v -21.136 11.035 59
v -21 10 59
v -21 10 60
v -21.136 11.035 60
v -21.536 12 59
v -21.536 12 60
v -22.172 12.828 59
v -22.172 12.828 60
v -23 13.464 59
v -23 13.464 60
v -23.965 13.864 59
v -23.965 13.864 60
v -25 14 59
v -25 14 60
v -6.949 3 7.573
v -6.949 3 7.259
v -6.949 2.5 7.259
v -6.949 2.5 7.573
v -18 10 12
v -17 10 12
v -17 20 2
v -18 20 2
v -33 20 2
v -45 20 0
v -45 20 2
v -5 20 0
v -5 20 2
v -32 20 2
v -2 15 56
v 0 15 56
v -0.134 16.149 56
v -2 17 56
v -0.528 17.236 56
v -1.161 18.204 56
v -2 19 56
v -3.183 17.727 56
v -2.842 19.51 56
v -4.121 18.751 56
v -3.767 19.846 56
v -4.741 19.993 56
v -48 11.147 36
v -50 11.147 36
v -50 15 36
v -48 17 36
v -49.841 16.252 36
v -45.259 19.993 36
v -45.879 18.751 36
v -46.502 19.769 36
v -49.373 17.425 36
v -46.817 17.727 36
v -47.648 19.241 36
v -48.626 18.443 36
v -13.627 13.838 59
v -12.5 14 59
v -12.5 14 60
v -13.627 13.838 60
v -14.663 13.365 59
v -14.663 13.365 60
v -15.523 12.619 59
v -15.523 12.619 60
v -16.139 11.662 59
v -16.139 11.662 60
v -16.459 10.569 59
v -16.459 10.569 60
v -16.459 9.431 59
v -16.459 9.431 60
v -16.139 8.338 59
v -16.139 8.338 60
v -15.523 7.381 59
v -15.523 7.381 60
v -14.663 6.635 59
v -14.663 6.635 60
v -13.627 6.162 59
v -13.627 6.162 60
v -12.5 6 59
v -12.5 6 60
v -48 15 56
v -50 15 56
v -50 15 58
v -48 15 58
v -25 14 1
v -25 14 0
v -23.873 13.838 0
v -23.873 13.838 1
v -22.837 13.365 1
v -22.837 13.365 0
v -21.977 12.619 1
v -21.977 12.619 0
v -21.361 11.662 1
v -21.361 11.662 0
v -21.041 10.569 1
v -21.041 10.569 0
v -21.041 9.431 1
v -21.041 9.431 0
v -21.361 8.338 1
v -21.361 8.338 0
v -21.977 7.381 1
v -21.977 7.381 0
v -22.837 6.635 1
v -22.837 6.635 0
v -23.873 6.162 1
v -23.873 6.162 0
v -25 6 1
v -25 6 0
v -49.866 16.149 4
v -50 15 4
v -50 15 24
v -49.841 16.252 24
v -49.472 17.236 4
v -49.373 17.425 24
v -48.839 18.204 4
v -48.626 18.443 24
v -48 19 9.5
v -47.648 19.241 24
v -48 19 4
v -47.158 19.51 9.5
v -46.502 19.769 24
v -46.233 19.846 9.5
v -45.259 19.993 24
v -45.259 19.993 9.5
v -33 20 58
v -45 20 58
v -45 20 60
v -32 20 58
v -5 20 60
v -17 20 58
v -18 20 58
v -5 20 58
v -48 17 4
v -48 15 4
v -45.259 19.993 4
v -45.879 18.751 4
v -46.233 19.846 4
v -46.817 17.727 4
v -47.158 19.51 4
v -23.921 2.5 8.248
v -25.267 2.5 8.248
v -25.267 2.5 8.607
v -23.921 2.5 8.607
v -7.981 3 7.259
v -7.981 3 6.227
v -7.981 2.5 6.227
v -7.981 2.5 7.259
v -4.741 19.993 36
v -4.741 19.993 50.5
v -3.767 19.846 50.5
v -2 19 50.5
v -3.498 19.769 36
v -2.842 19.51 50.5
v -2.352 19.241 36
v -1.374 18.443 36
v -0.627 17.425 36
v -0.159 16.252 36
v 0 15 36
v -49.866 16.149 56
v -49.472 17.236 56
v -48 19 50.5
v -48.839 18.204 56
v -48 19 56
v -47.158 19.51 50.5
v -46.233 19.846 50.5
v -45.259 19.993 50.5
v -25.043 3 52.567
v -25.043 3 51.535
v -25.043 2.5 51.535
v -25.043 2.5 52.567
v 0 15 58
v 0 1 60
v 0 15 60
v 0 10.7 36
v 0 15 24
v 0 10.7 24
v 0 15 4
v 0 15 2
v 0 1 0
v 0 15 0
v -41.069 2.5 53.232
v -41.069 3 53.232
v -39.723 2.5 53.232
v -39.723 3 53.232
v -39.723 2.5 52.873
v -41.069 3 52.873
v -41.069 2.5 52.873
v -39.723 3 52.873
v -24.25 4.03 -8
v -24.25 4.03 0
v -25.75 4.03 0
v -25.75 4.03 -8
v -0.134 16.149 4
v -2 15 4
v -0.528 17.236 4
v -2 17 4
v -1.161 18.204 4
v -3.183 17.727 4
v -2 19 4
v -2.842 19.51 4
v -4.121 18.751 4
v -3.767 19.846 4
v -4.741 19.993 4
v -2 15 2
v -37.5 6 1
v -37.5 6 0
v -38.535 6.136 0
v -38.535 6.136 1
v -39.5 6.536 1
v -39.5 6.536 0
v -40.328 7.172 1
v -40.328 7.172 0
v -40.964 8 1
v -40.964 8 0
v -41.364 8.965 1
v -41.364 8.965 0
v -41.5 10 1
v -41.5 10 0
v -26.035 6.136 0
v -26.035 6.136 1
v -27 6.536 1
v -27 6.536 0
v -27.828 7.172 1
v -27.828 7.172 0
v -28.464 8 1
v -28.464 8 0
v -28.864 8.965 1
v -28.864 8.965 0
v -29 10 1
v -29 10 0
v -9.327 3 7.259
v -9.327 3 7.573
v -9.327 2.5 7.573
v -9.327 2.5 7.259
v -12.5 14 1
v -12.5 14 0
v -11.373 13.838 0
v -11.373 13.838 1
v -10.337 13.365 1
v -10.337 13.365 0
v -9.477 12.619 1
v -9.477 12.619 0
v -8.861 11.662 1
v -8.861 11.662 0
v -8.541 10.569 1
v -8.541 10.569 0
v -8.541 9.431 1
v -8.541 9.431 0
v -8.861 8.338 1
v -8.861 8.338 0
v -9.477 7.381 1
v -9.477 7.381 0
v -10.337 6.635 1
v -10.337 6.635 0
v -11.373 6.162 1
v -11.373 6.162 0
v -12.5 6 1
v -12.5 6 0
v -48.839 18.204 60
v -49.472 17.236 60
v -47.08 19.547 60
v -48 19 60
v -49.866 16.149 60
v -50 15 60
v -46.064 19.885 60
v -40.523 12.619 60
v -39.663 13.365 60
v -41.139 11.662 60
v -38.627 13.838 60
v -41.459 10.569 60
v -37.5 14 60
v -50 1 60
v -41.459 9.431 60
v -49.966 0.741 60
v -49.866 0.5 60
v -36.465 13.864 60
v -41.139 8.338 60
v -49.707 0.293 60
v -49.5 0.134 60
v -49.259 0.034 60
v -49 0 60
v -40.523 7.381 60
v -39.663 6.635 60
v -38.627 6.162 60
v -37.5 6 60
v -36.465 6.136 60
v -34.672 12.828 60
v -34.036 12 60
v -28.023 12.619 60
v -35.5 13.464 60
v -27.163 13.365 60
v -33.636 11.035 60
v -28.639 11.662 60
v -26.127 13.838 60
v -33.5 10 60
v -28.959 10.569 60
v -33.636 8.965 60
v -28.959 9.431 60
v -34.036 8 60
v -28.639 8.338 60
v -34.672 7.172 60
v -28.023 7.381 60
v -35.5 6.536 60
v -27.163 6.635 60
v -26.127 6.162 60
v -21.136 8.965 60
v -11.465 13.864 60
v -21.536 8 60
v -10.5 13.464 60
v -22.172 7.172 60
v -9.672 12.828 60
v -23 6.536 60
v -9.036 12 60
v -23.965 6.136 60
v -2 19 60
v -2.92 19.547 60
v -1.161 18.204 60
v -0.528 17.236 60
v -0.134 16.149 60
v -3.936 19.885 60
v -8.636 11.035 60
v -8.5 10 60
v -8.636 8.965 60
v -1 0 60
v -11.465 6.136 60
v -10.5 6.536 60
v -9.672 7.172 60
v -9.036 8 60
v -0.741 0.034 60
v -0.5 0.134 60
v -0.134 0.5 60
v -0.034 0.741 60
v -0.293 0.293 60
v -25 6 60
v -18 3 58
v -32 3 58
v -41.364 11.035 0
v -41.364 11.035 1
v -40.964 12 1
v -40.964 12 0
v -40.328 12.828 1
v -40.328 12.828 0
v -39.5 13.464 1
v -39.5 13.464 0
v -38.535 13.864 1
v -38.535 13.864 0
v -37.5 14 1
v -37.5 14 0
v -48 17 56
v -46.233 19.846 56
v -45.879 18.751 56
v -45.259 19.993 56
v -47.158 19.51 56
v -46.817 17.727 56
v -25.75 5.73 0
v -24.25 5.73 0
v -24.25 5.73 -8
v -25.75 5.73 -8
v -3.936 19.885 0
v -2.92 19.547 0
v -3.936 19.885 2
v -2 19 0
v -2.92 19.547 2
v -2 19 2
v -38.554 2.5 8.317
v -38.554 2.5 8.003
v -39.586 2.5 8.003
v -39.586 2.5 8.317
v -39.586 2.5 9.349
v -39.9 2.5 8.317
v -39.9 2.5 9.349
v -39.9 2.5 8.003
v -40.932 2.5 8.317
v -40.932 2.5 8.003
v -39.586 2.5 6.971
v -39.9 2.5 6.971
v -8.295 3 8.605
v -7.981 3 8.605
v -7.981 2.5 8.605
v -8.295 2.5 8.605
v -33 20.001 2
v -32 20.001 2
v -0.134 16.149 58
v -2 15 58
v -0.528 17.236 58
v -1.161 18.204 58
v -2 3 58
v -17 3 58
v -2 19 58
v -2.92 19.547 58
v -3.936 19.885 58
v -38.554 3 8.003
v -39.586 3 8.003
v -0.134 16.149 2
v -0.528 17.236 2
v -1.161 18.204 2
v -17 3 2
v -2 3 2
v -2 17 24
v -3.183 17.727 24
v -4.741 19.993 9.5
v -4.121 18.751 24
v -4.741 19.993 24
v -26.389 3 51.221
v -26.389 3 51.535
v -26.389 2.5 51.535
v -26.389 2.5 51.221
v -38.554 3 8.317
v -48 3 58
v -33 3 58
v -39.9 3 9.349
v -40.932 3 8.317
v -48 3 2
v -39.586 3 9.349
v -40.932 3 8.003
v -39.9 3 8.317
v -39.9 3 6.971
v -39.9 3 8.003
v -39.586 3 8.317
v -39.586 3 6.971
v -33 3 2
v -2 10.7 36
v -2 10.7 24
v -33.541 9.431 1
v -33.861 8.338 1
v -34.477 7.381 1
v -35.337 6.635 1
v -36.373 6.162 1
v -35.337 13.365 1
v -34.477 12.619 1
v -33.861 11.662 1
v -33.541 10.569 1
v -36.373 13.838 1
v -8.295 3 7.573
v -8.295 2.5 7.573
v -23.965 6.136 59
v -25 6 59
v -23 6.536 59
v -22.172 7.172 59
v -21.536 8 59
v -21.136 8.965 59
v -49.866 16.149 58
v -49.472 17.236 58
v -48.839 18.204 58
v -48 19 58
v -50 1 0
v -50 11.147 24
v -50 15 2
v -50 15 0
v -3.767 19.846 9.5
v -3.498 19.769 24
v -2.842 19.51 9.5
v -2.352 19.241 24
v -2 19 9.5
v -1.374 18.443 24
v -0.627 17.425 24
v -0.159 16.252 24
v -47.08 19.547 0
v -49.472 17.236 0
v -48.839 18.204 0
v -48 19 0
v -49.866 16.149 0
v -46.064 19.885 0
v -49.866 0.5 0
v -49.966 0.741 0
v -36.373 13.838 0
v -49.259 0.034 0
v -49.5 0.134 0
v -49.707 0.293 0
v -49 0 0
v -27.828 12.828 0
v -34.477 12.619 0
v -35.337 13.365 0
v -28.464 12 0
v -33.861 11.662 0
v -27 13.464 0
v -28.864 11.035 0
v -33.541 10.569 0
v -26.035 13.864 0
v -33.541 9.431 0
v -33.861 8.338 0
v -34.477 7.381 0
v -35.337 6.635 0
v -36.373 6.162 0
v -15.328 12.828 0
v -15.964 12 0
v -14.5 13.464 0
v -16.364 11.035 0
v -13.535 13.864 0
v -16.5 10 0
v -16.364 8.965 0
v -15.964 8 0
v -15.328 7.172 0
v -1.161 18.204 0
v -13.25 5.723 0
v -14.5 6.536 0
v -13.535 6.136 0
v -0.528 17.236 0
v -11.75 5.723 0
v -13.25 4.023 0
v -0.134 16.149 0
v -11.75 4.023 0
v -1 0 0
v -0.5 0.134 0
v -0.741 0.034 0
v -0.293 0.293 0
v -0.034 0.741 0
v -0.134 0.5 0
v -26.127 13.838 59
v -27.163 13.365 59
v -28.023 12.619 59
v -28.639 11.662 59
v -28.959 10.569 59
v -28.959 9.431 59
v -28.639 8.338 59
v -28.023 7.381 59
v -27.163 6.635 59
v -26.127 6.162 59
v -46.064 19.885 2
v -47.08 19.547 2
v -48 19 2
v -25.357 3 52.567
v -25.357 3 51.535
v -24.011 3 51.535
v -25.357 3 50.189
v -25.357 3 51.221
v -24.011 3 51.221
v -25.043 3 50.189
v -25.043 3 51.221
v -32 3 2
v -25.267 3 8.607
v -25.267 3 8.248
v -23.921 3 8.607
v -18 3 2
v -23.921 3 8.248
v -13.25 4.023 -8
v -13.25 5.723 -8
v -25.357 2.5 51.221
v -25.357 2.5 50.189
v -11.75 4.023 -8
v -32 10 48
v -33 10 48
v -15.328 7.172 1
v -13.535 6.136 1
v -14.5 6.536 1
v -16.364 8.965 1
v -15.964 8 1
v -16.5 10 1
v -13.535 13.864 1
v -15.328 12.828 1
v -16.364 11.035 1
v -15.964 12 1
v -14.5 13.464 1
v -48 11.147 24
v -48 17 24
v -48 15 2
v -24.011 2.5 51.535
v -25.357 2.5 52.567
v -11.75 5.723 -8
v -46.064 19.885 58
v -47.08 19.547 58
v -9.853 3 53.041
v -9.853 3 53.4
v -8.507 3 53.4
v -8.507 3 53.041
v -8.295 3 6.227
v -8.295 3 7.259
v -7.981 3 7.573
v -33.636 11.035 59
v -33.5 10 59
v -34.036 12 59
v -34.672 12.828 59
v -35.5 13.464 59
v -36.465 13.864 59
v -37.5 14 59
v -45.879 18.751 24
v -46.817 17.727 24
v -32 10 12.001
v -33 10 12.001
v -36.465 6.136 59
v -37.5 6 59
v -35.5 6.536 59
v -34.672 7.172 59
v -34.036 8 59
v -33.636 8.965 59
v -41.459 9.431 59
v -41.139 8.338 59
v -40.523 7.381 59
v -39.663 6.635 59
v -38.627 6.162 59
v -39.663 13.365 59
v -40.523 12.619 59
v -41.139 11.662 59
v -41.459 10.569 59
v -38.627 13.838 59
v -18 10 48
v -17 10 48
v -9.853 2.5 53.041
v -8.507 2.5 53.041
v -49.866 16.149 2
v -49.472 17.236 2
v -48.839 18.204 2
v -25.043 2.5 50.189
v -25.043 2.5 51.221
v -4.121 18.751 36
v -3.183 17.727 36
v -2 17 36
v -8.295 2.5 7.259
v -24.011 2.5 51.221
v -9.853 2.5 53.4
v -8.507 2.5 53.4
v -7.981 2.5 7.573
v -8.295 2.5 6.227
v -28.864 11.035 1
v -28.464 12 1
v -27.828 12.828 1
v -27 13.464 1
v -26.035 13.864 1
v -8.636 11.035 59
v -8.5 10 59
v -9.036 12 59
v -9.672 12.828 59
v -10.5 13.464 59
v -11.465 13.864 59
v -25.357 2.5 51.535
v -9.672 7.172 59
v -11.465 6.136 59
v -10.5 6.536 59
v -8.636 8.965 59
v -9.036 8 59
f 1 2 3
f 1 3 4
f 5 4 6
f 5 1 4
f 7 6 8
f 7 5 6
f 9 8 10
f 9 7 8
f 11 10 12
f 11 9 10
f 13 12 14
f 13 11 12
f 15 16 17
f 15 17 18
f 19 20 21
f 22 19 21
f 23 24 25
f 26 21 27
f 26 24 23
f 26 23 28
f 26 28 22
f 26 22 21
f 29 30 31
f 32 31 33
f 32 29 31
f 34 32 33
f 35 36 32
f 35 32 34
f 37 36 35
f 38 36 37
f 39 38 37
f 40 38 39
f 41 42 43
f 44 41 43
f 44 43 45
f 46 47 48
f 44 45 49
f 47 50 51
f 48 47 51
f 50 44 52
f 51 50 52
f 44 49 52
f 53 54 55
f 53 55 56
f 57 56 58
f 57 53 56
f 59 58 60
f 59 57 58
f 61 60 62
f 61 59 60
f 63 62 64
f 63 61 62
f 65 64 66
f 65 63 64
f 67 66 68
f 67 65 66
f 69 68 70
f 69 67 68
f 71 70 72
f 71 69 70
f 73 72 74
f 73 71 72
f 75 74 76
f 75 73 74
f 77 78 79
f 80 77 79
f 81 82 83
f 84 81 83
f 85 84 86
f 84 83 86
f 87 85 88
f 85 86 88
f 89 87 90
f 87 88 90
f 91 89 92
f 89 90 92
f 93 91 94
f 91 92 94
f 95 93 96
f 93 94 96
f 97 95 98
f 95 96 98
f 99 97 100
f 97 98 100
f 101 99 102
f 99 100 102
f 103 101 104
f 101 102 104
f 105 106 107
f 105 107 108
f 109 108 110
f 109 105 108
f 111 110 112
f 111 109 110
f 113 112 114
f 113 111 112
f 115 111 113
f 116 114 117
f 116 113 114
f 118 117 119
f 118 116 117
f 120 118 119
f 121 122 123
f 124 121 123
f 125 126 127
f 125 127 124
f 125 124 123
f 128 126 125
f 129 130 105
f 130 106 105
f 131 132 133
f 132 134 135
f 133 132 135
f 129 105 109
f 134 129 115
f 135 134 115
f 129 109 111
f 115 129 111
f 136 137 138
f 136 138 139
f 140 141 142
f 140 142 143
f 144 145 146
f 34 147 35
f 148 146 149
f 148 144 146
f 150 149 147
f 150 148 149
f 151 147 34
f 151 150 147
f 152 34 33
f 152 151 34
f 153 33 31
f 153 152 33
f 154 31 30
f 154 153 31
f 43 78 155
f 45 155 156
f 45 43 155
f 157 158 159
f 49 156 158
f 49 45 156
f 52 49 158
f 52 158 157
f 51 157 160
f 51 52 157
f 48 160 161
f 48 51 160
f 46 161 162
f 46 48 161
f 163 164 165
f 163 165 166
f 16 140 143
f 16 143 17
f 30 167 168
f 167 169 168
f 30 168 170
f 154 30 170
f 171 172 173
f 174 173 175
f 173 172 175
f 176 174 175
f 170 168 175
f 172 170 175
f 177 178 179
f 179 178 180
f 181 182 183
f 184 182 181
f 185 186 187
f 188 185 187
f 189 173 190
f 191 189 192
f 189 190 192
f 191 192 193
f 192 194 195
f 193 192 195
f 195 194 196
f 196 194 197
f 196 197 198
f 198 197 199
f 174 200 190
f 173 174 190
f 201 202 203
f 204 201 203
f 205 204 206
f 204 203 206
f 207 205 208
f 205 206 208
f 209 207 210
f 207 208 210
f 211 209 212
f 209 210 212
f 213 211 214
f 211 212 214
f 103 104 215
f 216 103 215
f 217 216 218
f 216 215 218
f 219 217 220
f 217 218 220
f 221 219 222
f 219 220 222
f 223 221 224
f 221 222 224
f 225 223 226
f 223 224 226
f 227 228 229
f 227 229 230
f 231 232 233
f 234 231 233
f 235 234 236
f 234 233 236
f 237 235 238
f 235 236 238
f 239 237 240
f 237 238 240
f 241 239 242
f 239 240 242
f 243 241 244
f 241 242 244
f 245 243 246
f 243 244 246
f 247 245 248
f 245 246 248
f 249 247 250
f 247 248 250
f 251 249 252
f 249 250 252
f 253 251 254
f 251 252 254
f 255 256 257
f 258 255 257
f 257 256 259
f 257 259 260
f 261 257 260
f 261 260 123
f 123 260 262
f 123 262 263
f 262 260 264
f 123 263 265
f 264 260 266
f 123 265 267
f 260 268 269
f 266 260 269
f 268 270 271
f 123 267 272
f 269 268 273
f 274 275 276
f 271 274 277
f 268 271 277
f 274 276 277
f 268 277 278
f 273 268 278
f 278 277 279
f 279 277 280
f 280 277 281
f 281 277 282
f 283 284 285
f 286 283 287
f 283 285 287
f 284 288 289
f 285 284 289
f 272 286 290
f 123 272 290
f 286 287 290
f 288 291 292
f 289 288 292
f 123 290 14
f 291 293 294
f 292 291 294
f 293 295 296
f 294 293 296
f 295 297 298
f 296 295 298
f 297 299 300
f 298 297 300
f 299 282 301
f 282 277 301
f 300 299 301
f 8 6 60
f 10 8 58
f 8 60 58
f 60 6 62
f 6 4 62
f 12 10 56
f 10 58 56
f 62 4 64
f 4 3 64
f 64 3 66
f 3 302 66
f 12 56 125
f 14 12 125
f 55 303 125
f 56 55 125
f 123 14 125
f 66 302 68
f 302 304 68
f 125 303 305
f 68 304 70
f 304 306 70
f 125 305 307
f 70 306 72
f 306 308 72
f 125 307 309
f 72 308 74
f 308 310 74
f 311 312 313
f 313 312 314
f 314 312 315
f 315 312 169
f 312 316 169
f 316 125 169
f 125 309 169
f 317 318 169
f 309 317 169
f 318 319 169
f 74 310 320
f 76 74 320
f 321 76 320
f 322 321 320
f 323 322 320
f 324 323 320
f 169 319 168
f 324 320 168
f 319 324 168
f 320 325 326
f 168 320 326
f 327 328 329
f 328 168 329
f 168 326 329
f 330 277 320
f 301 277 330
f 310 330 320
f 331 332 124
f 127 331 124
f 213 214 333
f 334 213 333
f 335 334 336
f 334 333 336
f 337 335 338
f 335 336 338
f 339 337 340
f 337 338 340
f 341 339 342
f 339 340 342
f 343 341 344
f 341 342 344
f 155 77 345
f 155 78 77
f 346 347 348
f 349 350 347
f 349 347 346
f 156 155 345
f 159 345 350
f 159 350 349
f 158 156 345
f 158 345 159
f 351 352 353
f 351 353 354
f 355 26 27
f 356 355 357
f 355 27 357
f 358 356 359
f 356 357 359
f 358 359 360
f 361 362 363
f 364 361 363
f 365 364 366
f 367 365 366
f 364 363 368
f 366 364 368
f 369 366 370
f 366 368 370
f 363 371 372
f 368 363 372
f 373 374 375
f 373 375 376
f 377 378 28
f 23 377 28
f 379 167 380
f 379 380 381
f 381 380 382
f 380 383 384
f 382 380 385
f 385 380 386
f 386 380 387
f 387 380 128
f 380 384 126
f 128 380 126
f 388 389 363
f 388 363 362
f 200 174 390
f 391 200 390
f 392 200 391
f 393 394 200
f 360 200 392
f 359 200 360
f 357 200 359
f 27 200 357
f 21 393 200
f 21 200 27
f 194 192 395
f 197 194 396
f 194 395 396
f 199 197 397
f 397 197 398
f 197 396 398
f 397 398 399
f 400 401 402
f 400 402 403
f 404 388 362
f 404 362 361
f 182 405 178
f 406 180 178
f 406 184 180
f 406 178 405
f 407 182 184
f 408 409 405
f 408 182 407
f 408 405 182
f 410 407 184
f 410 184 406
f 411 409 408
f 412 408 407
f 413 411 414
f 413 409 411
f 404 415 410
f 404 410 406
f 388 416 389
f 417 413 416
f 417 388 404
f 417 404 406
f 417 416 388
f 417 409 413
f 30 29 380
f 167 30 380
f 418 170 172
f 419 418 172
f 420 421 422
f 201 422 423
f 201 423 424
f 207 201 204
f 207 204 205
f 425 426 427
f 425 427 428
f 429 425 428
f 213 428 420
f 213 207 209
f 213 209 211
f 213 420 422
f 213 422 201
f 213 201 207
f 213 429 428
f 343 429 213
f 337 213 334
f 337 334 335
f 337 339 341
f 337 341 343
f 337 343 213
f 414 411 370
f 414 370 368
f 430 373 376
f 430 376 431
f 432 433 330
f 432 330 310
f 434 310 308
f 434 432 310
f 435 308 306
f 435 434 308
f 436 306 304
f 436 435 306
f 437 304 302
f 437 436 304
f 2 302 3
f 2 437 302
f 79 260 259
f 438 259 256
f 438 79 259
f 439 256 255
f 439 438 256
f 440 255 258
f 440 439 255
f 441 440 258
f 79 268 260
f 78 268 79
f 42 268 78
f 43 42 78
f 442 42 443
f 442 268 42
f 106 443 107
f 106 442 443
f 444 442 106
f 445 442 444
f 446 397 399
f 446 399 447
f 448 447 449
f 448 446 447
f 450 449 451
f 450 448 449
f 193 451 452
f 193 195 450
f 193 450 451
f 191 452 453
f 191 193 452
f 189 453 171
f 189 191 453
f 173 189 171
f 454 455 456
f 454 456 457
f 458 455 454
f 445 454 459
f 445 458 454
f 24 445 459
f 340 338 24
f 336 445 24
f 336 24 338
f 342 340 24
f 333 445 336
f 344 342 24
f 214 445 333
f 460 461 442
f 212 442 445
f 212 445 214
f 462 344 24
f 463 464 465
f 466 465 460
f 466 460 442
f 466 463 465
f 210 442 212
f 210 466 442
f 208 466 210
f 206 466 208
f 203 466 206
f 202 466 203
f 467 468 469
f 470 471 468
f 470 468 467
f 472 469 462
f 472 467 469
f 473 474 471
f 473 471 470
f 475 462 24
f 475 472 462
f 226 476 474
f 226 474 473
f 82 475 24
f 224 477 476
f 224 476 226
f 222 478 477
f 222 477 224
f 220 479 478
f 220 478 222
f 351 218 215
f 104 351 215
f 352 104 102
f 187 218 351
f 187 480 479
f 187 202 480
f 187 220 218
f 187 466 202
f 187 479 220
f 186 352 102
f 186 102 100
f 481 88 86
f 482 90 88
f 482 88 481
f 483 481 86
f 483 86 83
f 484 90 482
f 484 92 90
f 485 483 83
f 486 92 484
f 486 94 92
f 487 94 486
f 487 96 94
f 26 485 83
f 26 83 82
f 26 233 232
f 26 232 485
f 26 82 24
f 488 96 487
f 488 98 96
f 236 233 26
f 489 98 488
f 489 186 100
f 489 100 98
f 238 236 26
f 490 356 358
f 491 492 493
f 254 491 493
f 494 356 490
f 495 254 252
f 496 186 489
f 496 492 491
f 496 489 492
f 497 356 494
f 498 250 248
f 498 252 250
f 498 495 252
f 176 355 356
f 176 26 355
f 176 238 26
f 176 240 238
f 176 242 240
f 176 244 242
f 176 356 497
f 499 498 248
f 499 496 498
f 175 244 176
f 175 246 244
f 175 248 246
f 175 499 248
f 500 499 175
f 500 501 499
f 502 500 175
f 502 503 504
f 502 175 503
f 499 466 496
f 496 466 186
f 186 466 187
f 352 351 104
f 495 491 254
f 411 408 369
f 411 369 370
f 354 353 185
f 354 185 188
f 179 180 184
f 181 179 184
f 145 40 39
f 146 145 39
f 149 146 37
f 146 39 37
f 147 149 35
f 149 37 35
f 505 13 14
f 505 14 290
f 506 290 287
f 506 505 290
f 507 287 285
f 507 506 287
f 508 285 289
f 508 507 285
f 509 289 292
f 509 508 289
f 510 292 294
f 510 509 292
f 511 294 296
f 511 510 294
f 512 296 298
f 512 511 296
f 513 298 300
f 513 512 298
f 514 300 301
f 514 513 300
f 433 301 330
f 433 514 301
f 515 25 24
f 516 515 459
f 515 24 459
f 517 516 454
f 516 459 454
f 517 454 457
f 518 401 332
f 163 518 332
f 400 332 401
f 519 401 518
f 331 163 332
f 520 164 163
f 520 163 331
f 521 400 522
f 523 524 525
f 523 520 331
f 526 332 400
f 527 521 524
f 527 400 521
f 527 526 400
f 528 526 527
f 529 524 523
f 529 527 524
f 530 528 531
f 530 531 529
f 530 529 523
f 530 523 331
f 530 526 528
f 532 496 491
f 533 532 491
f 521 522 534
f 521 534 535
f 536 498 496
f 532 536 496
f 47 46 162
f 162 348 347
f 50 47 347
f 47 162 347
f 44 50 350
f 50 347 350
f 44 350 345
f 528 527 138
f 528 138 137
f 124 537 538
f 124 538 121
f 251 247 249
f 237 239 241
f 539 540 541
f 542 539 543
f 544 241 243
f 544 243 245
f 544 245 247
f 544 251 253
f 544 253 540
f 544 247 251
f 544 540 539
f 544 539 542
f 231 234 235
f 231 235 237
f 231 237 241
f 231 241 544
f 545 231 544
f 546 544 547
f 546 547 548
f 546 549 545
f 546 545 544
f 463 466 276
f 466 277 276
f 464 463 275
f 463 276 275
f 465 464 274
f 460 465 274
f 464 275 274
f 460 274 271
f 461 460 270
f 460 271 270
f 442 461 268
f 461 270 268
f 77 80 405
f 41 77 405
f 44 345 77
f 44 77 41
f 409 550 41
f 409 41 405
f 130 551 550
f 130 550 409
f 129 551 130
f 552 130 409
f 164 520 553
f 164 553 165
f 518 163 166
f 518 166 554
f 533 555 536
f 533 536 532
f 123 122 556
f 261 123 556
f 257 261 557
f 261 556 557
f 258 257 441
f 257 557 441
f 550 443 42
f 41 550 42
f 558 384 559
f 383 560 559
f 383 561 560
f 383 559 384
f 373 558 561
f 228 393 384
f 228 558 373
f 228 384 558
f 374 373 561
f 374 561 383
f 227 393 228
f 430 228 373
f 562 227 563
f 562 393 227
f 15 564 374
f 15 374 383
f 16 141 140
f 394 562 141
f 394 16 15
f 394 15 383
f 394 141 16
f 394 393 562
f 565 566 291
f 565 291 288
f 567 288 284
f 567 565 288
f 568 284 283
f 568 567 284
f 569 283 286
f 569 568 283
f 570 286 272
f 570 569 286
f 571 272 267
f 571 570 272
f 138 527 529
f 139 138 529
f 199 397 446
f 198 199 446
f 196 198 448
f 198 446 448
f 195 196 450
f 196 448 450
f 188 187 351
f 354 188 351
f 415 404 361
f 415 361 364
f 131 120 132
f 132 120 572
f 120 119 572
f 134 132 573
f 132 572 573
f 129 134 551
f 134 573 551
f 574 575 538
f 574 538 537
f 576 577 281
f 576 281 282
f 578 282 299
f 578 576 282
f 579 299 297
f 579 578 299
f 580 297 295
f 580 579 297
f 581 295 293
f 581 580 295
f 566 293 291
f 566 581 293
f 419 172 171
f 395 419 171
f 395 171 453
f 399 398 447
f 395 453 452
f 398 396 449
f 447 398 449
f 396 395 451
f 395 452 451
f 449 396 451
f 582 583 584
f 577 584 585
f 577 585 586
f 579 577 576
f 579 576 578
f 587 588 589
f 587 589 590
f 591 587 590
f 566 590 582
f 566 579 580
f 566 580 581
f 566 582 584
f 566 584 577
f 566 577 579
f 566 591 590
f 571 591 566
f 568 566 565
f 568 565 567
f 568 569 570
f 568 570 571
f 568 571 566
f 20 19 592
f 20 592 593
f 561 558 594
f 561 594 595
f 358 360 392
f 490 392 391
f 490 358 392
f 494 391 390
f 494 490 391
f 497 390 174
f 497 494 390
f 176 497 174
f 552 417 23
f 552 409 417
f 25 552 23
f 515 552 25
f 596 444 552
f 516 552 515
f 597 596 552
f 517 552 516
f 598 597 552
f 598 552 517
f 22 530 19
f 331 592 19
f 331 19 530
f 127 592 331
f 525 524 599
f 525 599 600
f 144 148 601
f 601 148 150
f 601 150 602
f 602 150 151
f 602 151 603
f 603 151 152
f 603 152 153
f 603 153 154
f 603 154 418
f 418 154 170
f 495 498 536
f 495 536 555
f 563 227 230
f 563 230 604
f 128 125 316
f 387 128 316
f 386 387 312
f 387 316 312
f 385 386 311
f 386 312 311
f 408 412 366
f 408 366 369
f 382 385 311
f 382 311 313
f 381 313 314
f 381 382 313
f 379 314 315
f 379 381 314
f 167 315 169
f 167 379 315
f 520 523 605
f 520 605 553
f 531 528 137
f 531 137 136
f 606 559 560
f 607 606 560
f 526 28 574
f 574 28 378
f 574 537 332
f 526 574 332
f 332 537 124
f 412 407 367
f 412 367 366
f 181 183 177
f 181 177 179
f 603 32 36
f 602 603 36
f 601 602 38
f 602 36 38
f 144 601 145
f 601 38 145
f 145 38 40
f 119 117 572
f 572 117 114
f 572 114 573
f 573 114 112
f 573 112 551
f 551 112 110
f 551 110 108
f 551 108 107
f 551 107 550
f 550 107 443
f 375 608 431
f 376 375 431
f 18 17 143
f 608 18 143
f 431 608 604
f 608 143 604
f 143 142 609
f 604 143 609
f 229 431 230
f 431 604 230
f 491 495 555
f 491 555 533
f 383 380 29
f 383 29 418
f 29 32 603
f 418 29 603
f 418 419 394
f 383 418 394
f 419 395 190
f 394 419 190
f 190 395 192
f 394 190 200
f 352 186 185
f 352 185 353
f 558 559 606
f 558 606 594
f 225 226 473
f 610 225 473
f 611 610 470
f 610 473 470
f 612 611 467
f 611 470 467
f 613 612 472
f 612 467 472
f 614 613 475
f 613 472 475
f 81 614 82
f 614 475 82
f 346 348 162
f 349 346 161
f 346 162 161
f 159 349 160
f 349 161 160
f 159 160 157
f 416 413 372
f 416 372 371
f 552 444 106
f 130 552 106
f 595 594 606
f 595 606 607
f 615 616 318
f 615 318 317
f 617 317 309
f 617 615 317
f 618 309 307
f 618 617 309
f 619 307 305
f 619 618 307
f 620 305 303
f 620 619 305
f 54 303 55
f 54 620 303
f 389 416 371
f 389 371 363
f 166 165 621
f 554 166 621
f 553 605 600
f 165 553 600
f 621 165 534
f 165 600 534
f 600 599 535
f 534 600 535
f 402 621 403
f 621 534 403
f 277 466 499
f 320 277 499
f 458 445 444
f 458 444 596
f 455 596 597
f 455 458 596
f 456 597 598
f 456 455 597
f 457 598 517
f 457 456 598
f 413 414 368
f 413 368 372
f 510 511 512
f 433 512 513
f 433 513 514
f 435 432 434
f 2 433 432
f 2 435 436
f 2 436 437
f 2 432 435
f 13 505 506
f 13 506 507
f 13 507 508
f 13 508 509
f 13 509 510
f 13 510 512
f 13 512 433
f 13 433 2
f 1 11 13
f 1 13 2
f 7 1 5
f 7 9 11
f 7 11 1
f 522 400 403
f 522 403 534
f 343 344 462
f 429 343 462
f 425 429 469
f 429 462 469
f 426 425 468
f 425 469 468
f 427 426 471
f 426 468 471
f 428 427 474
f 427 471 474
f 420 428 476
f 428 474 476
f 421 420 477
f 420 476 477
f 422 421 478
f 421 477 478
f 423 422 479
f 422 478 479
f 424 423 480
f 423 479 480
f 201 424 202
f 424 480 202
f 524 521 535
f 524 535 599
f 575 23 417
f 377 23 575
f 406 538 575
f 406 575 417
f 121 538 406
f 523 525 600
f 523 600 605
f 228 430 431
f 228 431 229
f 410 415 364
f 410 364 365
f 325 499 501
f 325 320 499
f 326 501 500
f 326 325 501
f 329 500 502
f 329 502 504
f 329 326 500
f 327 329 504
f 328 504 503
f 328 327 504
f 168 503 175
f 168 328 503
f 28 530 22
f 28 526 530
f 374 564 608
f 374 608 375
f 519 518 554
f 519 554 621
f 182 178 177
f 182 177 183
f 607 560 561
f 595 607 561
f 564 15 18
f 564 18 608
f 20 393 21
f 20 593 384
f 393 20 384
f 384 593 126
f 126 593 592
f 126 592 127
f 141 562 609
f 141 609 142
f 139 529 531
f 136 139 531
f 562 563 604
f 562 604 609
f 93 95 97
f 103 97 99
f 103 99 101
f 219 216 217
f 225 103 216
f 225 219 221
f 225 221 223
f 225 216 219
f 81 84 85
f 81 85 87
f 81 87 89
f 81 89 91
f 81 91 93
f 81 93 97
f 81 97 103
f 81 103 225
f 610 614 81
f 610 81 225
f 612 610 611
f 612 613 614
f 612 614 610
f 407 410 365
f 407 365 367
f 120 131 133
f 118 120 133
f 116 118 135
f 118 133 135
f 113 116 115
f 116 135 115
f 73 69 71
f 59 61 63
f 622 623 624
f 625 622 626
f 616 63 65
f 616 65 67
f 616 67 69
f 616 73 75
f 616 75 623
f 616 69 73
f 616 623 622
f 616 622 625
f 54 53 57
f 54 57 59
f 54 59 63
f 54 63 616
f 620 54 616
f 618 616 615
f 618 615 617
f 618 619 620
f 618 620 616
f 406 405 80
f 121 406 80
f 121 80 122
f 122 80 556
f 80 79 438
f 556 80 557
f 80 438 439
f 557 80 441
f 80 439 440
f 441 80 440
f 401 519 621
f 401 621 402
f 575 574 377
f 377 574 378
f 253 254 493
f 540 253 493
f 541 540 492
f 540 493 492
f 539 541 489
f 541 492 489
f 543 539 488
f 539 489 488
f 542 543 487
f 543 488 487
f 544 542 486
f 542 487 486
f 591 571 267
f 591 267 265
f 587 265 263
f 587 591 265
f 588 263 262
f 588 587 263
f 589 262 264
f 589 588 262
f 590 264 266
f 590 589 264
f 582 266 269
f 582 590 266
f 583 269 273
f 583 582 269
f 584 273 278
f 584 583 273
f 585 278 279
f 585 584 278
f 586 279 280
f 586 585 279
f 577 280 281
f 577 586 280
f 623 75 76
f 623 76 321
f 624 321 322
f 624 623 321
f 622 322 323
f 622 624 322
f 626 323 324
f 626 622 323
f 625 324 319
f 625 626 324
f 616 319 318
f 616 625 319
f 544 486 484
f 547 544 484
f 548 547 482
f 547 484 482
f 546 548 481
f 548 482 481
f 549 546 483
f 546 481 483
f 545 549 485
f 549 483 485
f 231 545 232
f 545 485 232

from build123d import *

# Parameters (mm, degrees)
ESQUISSE1_W             = 50
ESQUISSE1_H             = 17
BOSS_EXTRU_1_DEPTH      = 60
ESQUISSE2_W             = 46
ESQUISSE2_H             = 56
ENL_V_MAT_EXTRU_1_DEPTH = 14
ESQUISSE3_W             = 5
ESQUISSE3_H             = 60
BOSS_EXTRU_2_DEPTH      = 3
CONG_4_R                = 5
CONG_5_R                = 5
ESQUISSE4_W             = 6
ESQUISSE4_H             = 6.399260537
ESQUISSE4_H_2           = 4.300369731
ENL_V_MAT_EXTRU_2_DEPTH = 13
ESQUISSE5_W             = 6
ESQUISSE5_H             = 3.853440377
ESQUISSE5_H_2           = 6.397176283
ENL_V_MAT_EXTRU_3_DEPTH = 13
ESQUISSE6_W             = 46
ESQUISSE6_H             = 2
BOSS_EXTRU_3_DEPTH      = 3
CONG_6_R                = 5
CONG_7_R                = 5
CONG_8_R                = 5
ESQUISSE7_W             = 2
ESQUISSE7_H             = 5.210267062
ENL_V_MAT_EXTRU_4_DEPTH = 62
ESQUISSE8_W             = 2
ESQUISSE8_H             = 8.257223626
ENL_V_MAT_EXTRU_5_DEPTH = 62
ESQUISSE9_W             = 1
ESQUISSE9_H             = 56
BOSS_EXTRU_4_DEPTH      = 7
BOSS_EXTRU_5_DEPTH      = 1
BOSS_EXTRU_6_DEPTH      = 1
BOSS_EXTRU_7_DEPTH      = 1
BOSS_EXTRU_8_DEPTH      = 1
ENL_V_MAT_EXTRU_6_DEPTH = 0.5
ESQUISSE19_W            = 1.346153846
ESQUISSE19_H            = 0.358974359
ESQUISSE19_W_2          = 1.346153847
ENL_V_MAT_EXTRU_7_DEPTH = 0.5
CONG_9_R                = 1
CONG_10_R               = 1
ENL_V_MAT_EXTRU_8_DEPTH = 1
ENL_V_START             = -1
ENL_V_MAT_EXTRU_9_DEPTH = 1
ESQUISSE22_W            = 1.5
ESQUISSE22_H            = 1.7
BOSS_EXTRU_9_DEPTH      = 9


# Some blends are built 0.0001 mm under size
with BuildPart() as part:
    # Esquisse1 → Boss.-Extru.1 (new body)
    with BuildSketch(Plane.XY):
        with Locations((-25, 8.5)):
            Rectangle(ESQUISSE1_W, ESQUISSE1_H)
    extrude(amount=BOSS_EXTRU_1_DEPTH)

    # Esquisse2 → Enlèv. mat.-Extru.1 (cut)
    with BuildSketch(Plane(origin=(0, 17, 0), x_dir=(1, 0, 0), z_dir=(0, 1, 0))):
        with Locations((-25, -30)):
            Rectangle(ESQUISSE2_W, ESQUISSE2_H)
    extrude(amount=-ENL_V_MAT_EXTRU_1_DEPTH, mode=Mode.SUBTRACT)

    # Esquisse3 → Boss.-Extru.2 (add)
    with BuildSketch(Plane(origin=(0, 17, 0), x_dir=(1, 0, 0), z_dir=(0, 1, 0))):
        with Locations((-2.5, -30)):
            Rectangle(ESQUISSE3_W, ESQUISSE3_H)
        with Locations((-47.5, -30)):
            Rectangle(ESQUISSE3_W, ESQUISSE3_H)
    extrude(amount=BOSS_EXTRU_2_DEPTH)

    # Congé4
    cong_4_edges = [part.edges().sort_by_distance(p)[0] for p in [
        (-50, 20, 30),
        (0, 20, 30),
    ]]
    fillet(cong_4_edges, radius=CONG_4_R - 0.0001)  # a hair under: the kernel refuses the full size

    # Congé5
    # the kernel refuses this fillet: 5 mm, written as the material it takes off along each edge
    with BuildSketch(Plane(origin=(-45, 17, 69.456439237), x_dir=(0, 1, 0), z_dir=(0, 0, -1))) as cong_5_piece_1:
        with BuildLine():
            CenterArc((4.582575695, -5), CONG_5_R, 90, 66.421821522)
            Line((0, -3), (0, 0))
            Line((0, 0), (4.582575695, 0))
        make_face()
    extrude(amount=78.912878475, mode=Mode.SUBTRACT)
    with BuildSketch(Plane(origin=(-5, 17, 69.456439237), x_dir=(0, 1, 0), z_dir=(0, 0, -1))) as cong_5_piece_2:
        with BuildLine():
            CenterArc((4.582575695, 5), CONG_5_R, 203.578178478, 66.421821522)
            Line((0, 3), (0, 0))
            Line((0, 0), (4.582575695, 0))
        make_face()
    extrude(amount=78.912878475, mode=Mode.SUBTRACT)

    # Esquisse4 → Enlèv. mat.-Extru.2 (cut)
    with BuildSketch(Plane(origin=(0, 0, 0), x_dir=(0, 0, -1), z_dir=(1, 0, 0))):
        with Locations((-27, 18.199630269)):
            Rectangle(ESQUISSE4_W, ESQUISSE4_H)
        with Locations((-27, 12.849815135)):
            Rectangle(ESQUISSE4_W, ESQUISSE4_H_2)
        with Locations((-33, 12.849815135)):
            Rectangle(ESQUISSE4_W, ESQUISSE4_H_2)
        with Locations((-33, 18.199630269)):
            Rectangle(ESQUISSE4_W, ESQUISSE4_H)
    extrude(amount=-ENL_V_MAT_EXTRU_2_DEPTH, mode=Mode.SUBTRACT)

    # Esquisse5 → Enlèv. mat.-Extru.3 (cut)
    with BuildSketch(Plane.ZY.offset(50)):
        with Locations((27, 13.073279812)):
            Rectangle(ESQUISSE5_W, ESQUISSE5_H)
        with Locations((33, 13.073279812)):
            Rectangle(ESQUISSE5_W, ESQUISSE5_H)
        with Locations((33, 18.198588142)):
            Rectangle(ESQUISSE5_W, ESQUISSE5_H_2)
        with Locations((27, 18.198588142)):
            Rectangle(ESQUISSE5_W, ESQUISSE5_H_2)
    extrude(amount=-ENL_V_MAT_EXTRU_3_DEPTH, mode=Mode.SUBTRACT)

    # Esquisse6 → Boss.-Extru.3 (add)
    with BuildSketch(Plane(origin=(0, 17, 0), x_dir=(1, 0, 0), z_dir=(0, 1, 0))):
        with Locations((-25, -1)):
            Rectangle(ESQUISSE6_W, ESQUISSE6_H)
        with Locations((-25, -59)):
            Rectangle(ESQUISSE6_W, ESQUISSE6_H)
    extrude(amount=BOSS_EXTRU_3_DEPTH)

    # Congé6
    # the kernel refuses this fillet: 5 mm, written as the material it takes off along each edge
    with BuildSketch(Plane(origin=(-2, 20, 9.499833331), x_dir=(0, -1, 0), z_dir=(0, 0, -1))) as cong_6_piece_1:
        with BuildLine():
            CenterArc((5, 2.999933333), CONG_6_R, 180, 36.868942712)
            Line((0, 2.999933333), (-0.1, 2.999933333))
            Line((-0.1, 2.999933333), (-0.1, 0))
            Line((-0.1, 0), (0, -0.1))
            ThreePointArc((0, -0.1), (0.499975, -0.1), (0.919949, -0.059998667))
            Line((0.919949, -0.059998667), (0.99995, 0))
        make_face()
    extrude(amount=16.999666663, mode=Mode.SUBTRACT)

    # Congé7
    # the kernel refuses this fillet: 5 mm, written as the material it takes off along each edge
    with BuildSketch(Plane(origin=(-48, 20, -7.499833331), x_dir=(0, -1, 0), z_dir=(0, 0, 1))) as cong_7_piece_1:
        with BuildLine():
            CenterArc((5, 2.999933333), CONG_7_R, 180, 36.868942712)
            Line((0, 2.999933333), (-0.1, 2.999933333))
            Line((-0.1, 2.999933333), (-0.1, 0))
            Line((-0.1, 0), (0, -0.1))
            ThreePointArc((0, -0.1), (0.499975, -0.1), (0.919949, -0.059998667))
            Line((0.919949, -0.059998667), (0.99995, 0))
        make_face()
    extrude(amount=16.999666663, mode=Mode.SUBTRACT)

    # Congé8
    # the kernel refuses this fillet: 5 mm, written as the material it takes off along each edge
    with BuildSketch(Plane(origin=(-2, 20, 67.499833331), x_dir=(0, -1, 0), z_dir=(0, 0, -1))) as cong_8_piece_1:
        with BuildLine():
            CenterArc((5, 2.999933333), CONG_8_R, 180, 36.868942712)
            Line((0, 2.999933333), (-0.1, 2.999933333))
            Line((-0.1, 2.999933333), (-0.1, 0))
            Line((-0.1, 0), (0, -0.1))
            ThreePointArc((0, -0.1), (0.499975, -0.1), (0.919949, -0.059998667))
            Line((0.919949, -0.059998667), (0.99995, 0))
        make_face()
    extrude(amount=16.999666663, mode=Mode.SUBTRACT)
    with BuildSketch(Plane(origin=(-48, 20, 50.500166669), x_dir=(1, 0, 0), z_dir=(0, 0, 1))) as cong_8_piece_2:
        with BuildLine():
            CenterArc((2.999933333, -5), CONG_8_R, 90, 36.868942712)
            Line((0, -0.99995), (-0.059998667, -0.919949))
            ThreePointArc((-0.059998667, -0.919949), (-0.1, -0.499975), (-0.1, 0))
            Line((-0.1, 0), (0, 0.1))
            Line((0, 0.1), (2.999933333, 0.1))
            Line((2.999933333, 0.1), (2.999933333, 0))
        make_face()
    extrude(amount=16.999666663, mode=Mode.SUBTRACT)

    # Esquisse7 → Enlèv. mat.-Extru.4 (cut)
    with BuildSketch(Plane.ZY.offset(50)):
        with Locations((3, 17.605133531)):
            Rectangle(ESQUISSE7_W, ESQUISSE7_H)
    extrude(amount=-ENL_V_MAT_EXTRU_4_DEPTH, mode=Mode.SUBTRACT)

    # Esquisse8 → Enlèv. mat.-Extru.5 (cut)
    with BuildSketch(Plane.ZY.offset(50)):
        with Locations((57, 19.128611813)):
            Rectangle(ESQUISSE8_W, ESQUISSE8_H)
    extrude(amount=-ENL_V_MAT_EXTRU_5_DEPTH, mode=Mode.SUBTRACT)

    # Esquisse9 → Boss.-Extru.4 (add)
    with BuildSketch(Plane(origin=(0, 3, 0), x_dir=(1, 0, 0), z_dir=(0, 1, 0))):
        with Locations((-17.5, -30)):
            Rectangle(ESQUISSE9_W, ESQUISSE9_H)
        with Locations((-32.5, -30)):
            Rectangle(ESQUISSE9_W, ESQUISSE9_H)
    extrude(amount=BOSS_EXTRU_4_DEPTH)

    # Esquisse13 → Boss.-Extru.5 (add)
    with BuildSketch(Plane(origin=(-17, 0, 0), x_dir=(0, 0, -1), z_dir=(1, 0, 0))):
        Polygon((-58, 10), (-48, 10), (-58, 20), align=None)
    extrude(amount=-BOSS_EXTRU_5_DEPTH)

    # Esquisse15 → Boss.-Extru.6 (add)
    with BuildSketch(Plane(origin=(-32, 0, 0), x_dir=(0, 0, -1), z_dir=(1, 0, 0))):
        Polygon((-58, 10), (-48, 10), (-58, 20), align=None)
    extrude(amount=-BOSS_EXTRU_6_DEPTH)

    # Esquisse16 → Boss.-Extru.7 (add)
    with BuildSketch(Plane(origin=(-32, 0, 0), x_dir=(0, 0, -1), z_dir=(1, 0, 0))):
        Polygon((-2, 10), (-12.000546535, 10), (-2, 20.000546535), align=None)
    extrude(amount=-BOSS_EXTRU_7_DEPTH)

    # Esquisse17 → Boss.-Extru.8 (add)
    with BuildSketch(Plane(origin=(-17, 0, 0), x_dir=(0, 0, -1), z_dir=(1, 0, 0))):
        Polygon((-2, 10), (-12, 10), (-2, 20), align=None)
    extrude(amount=-BOSS_EXTRU_8_DEPTH)

    # Esquisse18 → Enlèv. mat.-Extru.6 (cut)
    with BuildSketch(Plane(origin=(0, 3, 0), x_dir=(1, 0, 0), z_dir=(0, 1, 0))):
        Polygon((-8.294815626, -7.258773386), (-8.294815626, -6.226722104), (-7.980713062, -6.226722104), (-7.980713062, -7.258773386), (-6.94866178, -7.258773386), (-6.94866178, -7.57287595), (-7.980713062, -7.57287595), (-7.980713062, -8.604927232), (-8.294815626, -8.604927232), (-8.294815626, -7.57287595), (-9.326866908, -7.57287595), (-9.326866908, -7.258773386), align=None)
        Polygon((-39.900421528, -8.003329449), (-39.900421528, -6.971278167), (-39.586318963, -6.971278167), (-39.586318963, -8.003329449), (-38.554267681, -8.003329449), (-38.554267681, -8.317432014), (-39.586318963, -8.317432014), (-39.586318963, -9.349483296), (-39.900421528, -9.349483296), (-39.900421528, -8.317432014), (-40.93247281, -8.317432014), (-40.93247281, -8.003329449), align=None)
        Polygon((-25.356909486, -51.22098936), (-25.356909486, -50.188938078), (-25.042806922, -50.188938078), (-25.042806922, -51.22098936), (-24.01075564, -51.22098936), (-24.01075564, -51.535091925), (-25.042806922, -51.535091925), (-25.042806922, -52.567143207), (-25.356909486, -52.567143207), (-25.356909486, -51.535091925), (-26.388960769, -51.535091925), (-26.388960769, -51.22098936), align=None)
    extrude(amount=-ENL_V_MAT_EXTRU_6_DEPTH, mode=Mode.SUBTRACT)

    # Esquisse19 → Enlèv. mat.-Extru.7 (cut)
    with BuildSketch(Plane(origin=(0, 3, 0), x_dir=(1, 0, 0), z_dir=(0, 1, 0))):
        with Locations((-40.395987335, -53.05240306)):
            Rectangle(ESQUISSE19_W, ESQUISSE19_H)
        with Locations((-24.593970415, -8.42730727)):
            Rectangle(ESQUISSE19_W, ESQUISSE19_H)
        with Locations((-9.180137719, -53.220847448)):
            Rectangle(ESQUISSE19_W_2, ESQUISSE19_H)
    extrude(amount=-ENL_V_MAT_EXTRU_7_DEPTH, mode=Mode.SUBTRACT)

    # Congé9
    cong_9_edges = [part.edges().sort_by_distance(p)[0] for p in [
        (0, 0, 30),
    ]]
    fillet(cong_9_edges, radius=CONG_9_R)

    # Congé10
    cong_10_edges = [part.edges().sort_by_distance(p)[0] for p in [
        (-50, 0, 30),
    ]]
    fillet(cong_10_edges, radius=CONG_10_R)

    # Esquisse20 → Enlèv. mat.-Extru.8 (cut)
    with BuildSketch(Plane(origin=(0, 0, 0), x_dir=(-1, 0, 0), z_dir=(0, 0, -1))):
        with BuildLine():
            ThreePointArc((12.5, 14), (8.5, 10), (12.5, 6))
            Line((12.5, 6), (12.5, 14))
        make_face()
        with BuildLine():
            Line((12.5, 14), (12.5, 6))
            ThreePointArc((12.5, 6), (15.328427125, 7.171572875), (16.5, 10))
            ThreePointArc((16.5, 10), (15.328427125, 12.828427125), (12.5, 14))
        make_face()
        with BuildLine():
            ThreePointArc((25, 14), (21, 10), (25, 6))
            Line((25, 6), (25, 14))
        make_face()
        with BuildLine():
            Line((25, 14), (25, 6))
            ThreePointArc((25, 6), (27.828427125, 7.171572875), (29, 10))
            ThreePointArc((29, 10), (27.828427125, 12.828427125), (25, 14))
        make_face()
        with BuildLine():
            ThreePointArc((37.5, 14), (33.5, 10), (37.5, 6))
            Line((37.5, 6), (37.5, 14))
        make_face()
        with BuildLine():
            Line((37.5, 14), (37.5, 6))
            ThreePointArc((37.5, 6), (40.328427125, 7.171572875), (41.5, 10))
            ThreePointArc((41.5, 10), (40.328427125, 12.828427125), (37.5, 14))
        make_face()
    extrude(amount=-ENL_V_MAT_EXTRU_8_DEPTH, mode=Mode.SUBTRACT)

    # Esquisse21 → Enlèv. mat.-Extru.9 (cut)
    with BuildSketch(Plane.XY.offset(60).offset(ENL_V_START)):
        with BuildLine():
            ThreePointArc((-37.5, 14), (-41.5, 10), (-37.5, 6))
            Line((-37.5, 6), (-37.5, 14))
        make_face()
        with BuildLine():
            Line((-37.5, 14), (-37.5, 6))
            ThreePointArc((-37.5, 6), (-34.671572875, 7.171572875), (-33.5, 10))
            ThreePointArc((-33.5, 10), (-34.671572875, 12.828427125), (-37.5, 14))
        make_face()
        with BuildLine():
            ThreePointArc((-25, 14), (-29, 10), (-25, 6))
            Line((-25, 6), (-25, 14))
        make_face()
        with BuildLine():
            Line((-25, 14), (-25, 6))
            ThreePointArc((-25, 6), (-22.171572875, 7.171572875), (-21, 10))
            ThreePointArc((-21, 10), (-22.171572875, 12.828427125), (-25, 14))
        make_face()
        with BuildLine():
            ThreePointArc((-12.5, 14), (-16.5, 10), (-12.5, 6))
            Line((-12.5, 6), (-12.5, 14))
        make_face()
        with BuildLine():
            Line((-12.5, 14), (-12.5, 6))
            ThreePointArc((-12.5, 6), (-9.671572875, 7.171572875), (-8.5, 10))
            ThreePointArc((-8.5, 10), (-9.671572875, 12.828427125), (-12.5, 14))
        make_face()
    extrude(amount=ENL_V_MAT_EXTRU_9_DEPTH, mode=Mode.SUBTRACT)

    # Esquisse22 → Boss.-Extru.9 (add)
    with BuildSketch(Plane(origin=(0, 0, 1), x_dir=(-1, 0, 0), z_dir=(0, 0, -1))):
        with Locations((12.5, 4.873394073)):
            Rectangle(ESQUISSE22_W, ESQUISSE22_H)
        with Locations((25, 4.880168725)):
            Rectangle(ESQUISSE22_W, ESQUISSE22_H)
    extrude(amount=BOSS_EXTRU_9_DEPTH)


solid = part.part
